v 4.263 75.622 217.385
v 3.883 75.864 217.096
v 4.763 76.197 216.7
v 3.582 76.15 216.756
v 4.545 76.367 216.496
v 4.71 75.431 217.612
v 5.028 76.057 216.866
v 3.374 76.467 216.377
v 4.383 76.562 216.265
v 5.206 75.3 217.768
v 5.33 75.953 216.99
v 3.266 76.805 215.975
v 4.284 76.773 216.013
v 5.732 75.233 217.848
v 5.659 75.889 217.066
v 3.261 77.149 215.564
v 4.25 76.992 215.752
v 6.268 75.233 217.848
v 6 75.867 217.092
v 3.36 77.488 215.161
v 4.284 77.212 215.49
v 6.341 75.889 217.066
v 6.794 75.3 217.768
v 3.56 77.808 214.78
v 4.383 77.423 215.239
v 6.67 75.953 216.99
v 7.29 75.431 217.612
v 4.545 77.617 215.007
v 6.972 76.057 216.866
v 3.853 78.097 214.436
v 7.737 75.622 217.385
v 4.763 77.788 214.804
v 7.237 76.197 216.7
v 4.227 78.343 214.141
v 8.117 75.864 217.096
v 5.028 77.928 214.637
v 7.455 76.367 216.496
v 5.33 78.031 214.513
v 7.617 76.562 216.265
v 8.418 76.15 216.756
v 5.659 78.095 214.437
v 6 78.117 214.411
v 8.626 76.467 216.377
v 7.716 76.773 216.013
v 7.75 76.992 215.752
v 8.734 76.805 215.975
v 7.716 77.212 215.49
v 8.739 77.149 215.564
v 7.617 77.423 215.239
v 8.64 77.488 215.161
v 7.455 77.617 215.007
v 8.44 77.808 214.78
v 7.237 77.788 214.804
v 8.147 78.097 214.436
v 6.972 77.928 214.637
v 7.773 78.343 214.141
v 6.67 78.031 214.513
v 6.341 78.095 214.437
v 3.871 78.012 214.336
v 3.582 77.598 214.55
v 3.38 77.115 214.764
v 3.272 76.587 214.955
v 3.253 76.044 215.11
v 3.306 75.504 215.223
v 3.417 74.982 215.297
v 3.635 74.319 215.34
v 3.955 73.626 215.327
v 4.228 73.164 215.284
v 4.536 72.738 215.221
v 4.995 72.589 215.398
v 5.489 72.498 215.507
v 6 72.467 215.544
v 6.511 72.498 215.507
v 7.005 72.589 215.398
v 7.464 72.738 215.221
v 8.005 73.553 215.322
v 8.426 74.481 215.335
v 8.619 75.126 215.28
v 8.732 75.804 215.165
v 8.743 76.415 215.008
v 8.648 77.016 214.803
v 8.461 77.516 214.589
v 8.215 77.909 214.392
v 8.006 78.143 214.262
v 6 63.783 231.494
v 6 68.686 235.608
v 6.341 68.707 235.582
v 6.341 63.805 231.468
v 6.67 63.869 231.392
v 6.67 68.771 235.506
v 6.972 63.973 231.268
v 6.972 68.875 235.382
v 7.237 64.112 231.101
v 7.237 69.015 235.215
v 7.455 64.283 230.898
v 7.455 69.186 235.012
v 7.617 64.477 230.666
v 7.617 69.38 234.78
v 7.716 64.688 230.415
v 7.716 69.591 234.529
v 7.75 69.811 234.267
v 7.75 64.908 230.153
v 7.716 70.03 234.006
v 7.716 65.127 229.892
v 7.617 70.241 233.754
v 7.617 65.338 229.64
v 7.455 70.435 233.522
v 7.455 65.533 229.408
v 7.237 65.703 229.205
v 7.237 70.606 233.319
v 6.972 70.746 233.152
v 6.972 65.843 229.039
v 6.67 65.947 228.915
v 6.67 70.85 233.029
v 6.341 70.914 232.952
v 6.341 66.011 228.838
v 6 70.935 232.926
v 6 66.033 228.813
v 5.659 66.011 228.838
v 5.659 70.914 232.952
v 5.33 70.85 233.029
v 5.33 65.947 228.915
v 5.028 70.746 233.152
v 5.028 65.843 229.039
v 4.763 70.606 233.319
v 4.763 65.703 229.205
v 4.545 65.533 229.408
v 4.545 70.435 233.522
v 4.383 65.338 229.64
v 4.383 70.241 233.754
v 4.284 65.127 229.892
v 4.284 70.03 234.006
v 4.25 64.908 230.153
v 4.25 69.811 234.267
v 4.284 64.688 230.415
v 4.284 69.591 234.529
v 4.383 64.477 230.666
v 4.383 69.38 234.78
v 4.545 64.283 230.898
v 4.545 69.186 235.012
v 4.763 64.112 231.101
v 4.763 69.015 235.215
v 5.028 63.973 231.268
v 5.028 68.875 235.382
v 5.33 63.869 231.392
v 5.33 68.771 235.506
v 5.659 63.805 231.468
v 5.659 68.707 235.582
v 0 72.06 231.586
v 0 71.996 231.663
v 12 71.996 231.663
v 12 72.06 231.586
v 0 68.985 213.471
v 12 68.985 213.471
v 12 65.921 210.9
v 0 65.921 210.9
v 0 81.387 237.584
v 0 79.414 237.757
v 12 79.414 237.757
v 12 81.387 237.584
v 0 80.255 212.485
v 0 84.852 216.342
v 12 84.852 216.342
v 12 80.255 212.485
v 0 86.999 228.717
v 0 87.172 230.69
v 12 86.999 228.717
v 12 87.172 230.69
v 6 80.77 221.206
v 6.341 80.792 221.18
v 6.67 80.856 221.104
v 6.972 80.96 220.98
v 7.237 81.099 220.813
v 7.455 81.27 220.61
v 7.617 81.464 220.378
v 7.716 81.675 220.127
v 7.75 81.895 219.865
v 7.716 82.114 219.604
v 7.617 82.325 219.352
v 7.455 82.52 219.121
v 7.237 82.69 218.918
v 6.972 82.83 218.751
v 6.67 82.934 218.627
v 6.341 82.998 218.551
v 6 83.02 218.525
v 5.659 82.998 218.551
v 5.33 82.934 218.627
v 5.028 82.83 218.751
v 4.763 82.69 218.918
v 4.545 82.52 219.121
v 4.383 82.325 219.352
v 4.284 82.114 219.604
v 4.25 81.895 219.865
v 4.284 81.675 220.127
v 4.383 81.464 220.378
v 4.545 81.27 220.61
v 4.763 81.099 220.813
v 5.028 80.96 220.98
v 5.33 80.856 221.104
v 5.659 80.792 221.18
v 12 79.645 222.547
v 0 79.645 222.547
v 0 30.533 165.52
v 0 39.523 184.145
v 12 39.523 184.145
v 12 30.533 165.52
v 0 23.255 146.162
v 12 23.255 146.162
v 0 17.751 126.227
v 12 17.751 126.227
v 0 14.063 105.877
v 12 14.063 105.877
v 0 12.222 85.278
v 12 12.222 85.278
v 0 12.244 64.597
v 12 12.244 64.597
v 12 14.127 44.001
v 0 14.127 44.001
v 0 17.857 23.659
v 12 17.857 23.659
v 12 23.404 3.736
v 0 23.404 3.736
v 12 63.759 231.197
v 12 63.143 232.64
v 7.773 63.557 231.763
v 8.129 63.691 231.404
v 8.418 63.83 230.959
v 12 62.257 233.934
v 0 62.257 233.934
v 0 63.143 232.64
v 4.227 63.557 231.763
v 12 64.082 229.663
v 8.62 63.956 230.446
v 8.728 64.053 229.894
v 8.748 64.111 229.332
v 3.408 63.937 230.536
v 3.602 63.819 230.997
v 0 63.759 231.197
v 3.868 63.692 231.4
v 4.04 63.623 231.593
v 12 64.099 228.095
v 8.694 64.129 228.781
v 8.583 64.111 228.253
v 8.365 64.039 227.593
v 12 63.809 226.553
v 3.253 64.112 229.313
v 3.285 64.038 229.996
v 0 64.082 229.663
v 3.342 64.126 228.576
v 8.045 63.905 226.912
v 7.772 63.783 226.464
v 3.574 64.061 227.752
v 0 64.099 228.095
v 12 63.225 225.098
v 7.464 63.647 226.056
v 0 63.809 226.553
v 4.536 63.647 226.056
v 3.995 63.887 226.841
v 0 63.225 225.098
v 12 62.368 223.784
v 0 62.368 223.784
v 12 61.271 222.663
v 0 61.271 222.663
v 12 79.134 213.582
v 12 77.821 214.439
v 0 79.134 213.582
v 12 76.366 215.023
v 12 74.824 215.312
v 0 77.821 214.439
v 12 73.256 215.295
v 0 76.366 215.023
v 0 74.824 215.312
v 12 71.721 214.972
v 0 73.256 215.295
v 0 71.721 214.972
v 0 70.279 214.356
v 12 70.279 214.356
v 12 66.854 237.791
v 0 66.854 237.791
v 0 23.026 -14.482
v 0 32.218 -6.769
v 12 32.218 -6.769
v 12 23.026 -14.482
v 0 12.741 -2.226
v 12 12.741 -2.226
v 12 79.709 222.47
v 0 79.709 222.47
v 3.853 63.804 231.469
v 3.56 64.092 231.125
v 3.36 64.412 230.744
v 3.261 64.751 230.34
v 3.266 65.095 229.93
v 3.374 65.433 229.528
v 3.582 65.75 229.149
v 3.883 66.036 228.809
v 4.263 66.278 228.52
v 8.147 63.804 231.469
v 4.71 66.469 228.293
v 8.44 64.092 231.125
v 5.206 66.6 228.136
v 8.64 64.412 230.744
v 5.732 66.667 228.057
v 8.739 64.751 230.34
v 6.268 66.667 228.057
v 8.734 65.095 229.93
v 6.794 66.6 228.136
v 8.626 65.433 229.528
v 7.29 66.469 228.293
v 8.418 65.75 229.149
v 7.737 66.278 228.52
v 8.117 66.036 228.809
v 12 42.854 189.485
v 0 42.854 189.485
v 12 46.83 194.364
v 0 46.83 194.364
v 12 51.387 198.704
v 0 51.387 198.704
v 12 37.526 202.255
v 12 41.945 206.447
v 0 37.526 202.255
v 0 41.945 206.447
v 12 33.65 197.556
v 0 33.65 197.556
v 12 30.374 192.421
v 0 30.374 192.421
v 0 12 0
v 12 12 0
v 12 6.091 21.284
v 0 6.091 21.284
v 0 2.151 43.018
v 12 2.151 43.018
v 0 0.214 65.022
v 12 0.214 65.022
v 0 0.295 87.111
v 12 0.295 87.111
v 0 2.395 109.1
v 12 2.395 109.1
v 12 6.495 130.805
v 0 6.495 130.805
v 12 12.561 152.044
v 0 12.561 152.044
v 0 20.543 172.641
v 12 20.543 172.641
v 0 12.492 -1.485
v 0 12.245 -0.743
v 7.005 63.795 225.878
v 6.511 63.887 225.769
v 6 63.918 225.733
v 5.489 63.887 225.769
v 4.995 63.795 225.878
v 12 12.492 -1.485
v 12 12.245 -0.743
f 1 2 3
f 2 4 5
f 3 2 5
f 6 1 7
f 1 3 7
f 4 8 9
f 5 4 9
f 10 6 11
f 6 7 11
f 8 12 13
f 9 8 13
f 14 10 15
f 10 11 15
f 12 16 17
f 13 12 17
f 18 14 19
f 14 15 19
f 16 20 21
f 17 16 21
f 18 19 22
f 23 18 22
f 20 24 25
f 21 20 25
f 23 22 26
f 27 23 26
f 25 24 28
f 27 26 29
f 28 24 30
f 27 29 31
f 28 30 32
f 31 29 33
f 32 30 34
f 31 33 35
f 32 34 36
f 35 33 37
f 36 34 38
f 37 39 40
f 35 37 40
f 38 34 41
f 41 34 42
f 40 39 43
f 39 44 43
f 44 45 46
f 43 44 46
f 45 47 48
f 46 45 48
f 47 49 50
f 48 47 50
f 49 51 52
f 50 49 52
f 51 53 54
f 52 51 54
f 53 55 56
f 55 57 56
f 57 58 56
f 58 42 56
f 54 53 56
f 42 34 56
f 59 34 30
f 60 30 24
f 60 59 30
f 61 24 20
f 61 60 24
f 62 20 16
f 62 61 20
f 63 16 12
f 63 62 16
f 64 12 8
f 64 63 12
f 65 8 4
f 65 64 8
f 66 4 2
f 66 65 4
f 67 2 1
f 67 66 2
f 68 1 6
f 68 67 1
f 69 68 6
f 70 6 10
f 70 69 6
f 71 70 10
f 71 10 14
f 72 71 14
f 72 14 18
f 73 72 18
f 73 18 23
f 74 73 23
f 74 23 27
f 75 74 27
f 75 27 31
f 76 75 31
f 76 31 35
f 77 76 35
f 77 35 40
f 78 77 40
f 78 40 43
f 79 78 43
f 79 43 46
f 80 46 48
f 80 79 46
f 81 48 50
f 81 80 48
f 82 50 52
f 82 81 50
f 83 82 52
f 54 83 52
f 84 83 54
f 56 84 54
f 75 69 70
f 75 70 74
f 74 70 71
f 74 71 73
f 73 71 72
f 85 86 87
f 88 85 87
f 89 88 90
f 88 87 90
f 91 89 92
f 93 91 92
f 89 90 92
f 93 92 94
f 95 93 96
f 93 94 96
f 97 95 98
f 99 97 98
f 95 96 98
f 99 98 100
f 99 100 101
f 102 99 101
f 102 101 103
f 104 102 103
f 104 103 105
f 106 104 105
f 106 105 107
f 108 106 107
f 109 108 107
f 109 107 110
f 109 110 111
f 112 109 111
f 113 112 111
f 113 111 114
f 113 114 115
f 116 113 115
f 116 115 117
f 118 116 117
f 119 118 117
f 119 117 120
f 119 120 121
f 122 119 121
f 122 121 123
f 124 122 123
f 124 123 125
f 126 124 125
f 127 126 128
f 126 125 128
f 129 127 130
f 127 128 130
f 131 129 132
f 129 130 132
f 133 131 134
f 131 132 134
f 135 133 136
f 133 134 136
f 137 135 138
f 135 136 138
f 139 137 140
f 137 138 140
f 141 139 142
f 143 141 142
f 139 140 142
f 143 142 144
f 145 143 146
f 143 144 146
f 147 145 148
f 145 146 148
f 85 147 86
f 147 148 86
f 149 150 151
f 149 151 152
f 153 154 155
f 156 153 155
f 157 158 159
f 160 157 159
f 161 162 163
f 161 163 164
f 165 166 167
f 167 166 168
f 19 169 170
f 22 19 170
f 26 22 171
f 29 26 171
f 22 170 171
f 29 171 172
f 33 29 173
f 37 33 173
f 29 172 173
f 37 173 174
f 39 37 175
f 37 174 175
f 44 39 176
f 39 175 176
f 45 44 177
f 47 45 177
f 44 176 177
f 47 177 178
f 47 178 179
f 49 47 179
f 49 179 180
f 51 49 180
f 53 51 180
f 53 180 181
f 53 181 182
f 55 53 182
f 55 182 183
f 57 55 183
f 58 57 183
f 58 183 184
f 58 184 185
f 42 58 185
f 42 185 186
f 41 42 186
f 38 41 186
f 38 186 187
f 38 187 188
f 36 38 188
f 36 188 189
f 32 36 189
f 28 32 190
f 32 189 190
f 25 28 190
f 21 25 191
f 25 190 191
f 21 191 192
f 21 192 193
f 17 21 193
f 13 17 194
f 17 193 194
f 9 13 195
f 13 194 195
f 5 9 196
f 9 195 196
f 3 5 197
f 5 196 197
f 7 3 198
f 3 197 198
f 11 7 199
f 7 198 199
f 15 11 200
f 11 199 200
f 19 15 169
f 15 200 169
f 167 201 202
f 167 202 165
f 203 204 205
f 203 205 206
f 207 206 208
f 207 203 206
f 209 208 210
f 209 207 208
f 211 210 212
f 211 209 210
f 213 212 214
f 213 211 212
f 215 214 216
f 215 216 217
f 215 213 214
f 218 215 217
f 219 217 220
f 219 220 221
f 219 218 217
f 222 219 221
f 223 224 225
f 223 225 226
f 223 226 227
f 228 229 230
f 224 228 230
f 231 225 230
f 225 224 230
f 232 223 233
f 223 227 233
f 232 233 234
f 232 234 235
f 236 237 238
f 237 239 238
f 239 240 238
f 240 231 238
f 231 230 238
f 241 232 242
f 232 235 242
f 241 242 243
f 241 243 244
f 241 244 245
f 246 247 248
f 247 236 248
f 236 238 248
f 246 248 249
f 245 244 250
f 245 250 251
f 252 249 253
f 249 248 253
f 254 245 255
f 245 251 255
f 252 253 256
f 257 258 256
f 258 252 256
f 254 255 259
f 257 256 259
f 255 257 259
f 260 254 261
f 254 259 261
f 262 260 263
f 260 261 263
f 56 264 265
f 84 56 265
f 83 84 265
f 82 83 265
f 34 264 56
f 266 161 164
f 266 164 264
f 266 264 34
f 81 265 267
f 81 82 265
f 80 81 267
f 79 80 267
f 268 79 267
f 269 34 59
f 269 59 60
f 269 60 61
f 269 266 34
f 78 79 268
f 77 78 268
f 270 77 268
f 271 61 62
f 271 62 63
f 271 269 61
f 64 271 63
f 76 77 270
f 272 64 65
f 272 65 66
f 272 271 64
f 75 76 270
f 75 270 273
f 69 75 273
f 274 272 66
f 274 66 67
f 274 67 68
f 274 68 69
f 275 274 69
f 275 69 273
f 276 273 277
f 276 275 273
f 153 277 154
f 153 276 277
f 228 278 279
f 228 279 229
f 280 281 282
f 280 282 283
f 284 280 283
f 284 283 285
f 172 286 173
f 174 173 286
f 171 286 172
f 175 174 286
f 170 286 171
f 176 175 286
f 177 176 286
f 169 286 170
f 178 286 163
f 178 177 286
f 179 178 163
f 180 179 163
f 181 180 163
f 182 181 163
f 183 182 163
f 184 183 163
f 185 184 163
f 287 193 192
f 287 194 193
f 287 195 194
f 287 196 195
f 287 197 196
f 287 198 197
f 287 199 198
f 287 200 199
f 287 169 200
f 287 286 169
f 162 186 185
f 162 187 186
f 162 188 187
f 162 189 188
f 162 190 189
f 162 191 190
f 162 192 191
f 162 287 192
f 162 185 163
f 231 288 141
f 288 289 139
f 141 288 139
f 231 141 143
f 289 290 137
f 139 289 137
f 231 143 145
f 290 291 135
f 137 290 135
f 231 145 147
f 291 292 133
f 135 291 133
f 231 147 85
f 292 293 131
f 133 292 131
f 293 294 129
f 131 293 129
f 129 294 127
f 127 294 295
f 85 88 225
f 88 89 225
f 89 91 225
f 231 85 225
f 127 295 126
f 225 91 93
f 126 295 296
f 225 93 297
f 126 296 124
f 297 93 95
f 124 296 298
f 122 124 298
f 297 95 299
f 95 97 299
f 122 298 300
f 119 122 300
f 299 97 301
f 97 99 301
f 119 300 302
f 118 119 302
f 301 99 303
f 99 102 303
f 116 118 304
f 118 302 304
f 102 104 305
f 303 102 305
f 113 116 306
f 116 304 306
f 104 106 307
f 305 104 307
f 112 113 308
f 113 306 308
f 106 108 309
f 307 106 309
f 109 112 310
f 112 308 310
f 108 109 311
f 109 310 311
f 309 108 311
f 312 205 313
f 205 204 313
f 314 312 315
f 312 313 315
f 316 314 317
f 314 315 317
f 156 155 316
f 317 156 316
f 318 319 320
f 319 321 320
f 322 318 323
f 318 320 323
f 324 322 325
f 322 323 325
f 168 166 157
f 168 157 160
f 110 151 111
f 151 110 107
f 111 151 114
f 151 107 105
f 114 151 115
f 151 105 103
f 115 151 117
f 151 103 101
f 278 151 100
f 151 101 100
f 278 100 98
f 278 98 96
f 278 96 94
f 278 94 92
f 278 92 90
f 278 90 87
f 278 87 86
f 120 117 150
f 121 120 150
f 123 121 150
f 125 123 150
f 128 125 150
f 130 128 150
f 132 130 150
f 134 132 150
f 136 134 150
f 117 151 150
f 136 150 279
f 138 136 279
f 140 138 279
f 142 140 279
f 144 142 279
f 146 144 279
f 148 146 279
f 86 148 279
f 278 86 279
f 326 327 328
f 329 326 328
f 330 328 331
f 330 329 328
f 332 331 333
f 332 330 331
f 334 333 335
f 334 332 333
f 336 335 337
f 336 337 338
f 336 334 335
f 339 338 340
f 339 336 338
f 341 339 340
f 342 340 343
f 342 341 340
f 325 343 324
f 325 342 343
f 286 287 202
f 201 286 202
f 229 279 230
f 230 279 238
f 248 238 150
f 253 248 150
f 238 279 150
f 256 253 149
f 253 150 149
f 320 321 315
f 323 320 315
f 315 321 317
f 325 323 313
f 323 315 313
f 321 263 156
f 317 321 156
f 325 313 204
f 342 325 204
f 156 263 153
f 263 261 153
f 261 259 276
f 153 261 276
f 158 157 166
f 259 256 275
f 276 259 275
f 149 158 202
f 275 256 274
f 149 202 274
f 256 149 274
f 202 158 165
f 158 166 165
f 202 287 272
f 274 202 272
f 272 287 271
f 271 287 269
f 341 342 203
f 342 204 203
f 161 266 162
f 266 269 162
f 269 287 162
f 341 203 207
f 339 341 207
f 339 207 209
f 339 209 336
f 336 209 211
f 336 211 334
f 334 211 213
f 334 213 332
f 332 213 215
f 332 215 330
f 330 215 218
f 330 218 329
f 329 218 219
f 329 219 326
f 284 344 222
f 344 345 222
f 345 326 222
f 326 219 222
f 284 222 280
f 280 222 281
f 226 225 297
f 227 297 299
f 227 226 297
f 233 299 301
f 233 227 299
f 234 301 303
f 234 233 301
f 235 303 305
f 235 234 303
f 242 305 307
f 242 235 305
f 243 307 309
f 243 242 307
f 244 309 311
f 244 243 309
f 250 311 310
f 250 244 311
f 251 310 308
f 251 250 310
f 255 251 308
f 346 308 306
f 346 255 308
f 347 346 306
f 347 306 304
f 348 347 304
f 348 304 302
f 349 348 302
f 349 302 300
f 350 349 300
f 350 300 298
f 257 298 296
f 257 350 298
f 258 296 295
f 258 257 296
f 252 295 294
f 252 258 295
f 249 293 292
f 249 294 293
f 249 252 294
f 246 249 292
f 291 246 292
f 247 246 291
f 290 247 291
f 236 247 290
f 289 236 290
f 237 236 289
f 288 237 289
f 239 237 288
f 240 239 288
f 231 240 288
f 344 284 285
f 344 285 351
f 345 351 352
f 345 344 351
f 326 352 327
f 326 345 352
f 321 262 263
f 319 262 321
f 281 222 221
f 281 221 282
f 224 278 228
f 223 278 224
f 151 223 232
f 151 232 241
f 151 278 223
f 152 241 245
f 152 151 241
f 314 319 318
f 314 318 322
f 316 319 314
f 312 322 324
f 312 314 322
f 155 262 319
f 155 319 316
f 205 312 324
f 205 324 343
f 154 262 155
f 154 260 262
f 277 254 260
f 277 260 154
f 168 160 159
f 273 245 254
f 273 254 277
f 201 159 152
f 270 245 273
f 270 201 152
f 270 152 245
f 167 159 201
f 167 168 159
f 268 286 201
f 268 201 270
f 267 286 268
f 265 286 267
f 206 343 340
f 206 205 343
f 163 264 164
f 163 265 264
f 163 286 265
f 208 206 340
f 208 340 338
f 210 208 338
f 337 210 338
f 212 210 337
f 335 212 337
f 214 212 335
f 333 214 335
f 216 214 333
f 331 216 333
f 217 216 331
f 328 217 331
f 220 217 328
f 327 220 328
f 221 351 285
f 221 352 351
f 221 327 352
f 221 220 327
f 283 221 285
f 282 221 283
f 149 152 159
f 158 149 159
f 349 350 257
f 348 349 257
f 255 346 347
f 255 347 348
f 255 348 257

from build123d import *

# Parameters (mm, degrees)
AUFSATZ_LINEAR_AUSTRAGEN1_DEPTH = 12
AUFSATZ_LINEAR_AUSTRAGEN3_DEPTH = 12
AUFSATZ_LINEAR_AUSTRAGEN4_DEPTH = 12
SCHNITT_LINEAR_AUSTRAGEN1_DEPTH = 254.175024926
VERRUNDUNG1_R                   = 50
SKIZZE9_W                       = 12
SKIZZE9_H                       = 12
AUFSATZ_LINEAR_AUSTRAGEN6_DEPTH = 11
AUFSATZ_LINEAR_AUSTRAGEN7_DEPTH = 12
SKIZZE11_R                      = 1.75
SCHNITT_LINEAR_AUSTRAGEN3_DEPTH = 10
SKIZZE12_R                      = 2.75
SCHNITT_LINEAR_AUSTRAGEN4_DEPTH = 3.6
FASE1_SIZE                      = 1.5
SCHNITT_LINEAR_AUSTRAGEN8_DEPTH = 254.549622303


with BuildPart() as part:
    # Skizze1 → Aufsatz-Linear austragen1 (new body)
    with BuildSketch(Plane(origin=(0, 0, 0), x_dir=(0, 0, -1), z_dir=(1, 0, 0))):
        with BuildLine():
            Line((-240, 65), (-230.735708163, 72.773663864))
            ThreePointArc((-230.735708163, 72.773663864), (-123.944567763, 17.242039243), (-3.735818811, 23.403668612))
            Line((-3.735818811, 23.403668612), (0, 12))
            ThreePointArc((0, 12), (-127.247502729, 5.681119716), (-240, 65))
        make_face()
    extrude(amount=AUFSATZ_LINEAR_AUSTRAGEN1_DEPTH)

    # Skizze4 → Aufsatz-Linear austragen3 (add)
    with BuildSketch(Plane(origin=(0, 0, 0), x_dir=(0, 0, -1), z_dir=(1, 0, 0))):
        with BuildLine():
            Line((-3.735818811, 23.403668612), (6.769031275, 32.218284445))
            Line((6.769031275, 32.218284445), (14.482482591, 23.025751128))
            Line((14.482482591, 23.025751128), (2.225771501, 12.741149373))
            ThreePointArc((2.225771501, 12.741149373), (1.113785782, 12.367871772), (0, 12))
            Line((0, 12), (-3.735818811, 23.403668612))
        make_face()
    extrude(amount=AUFSATZ_LINEAR_AUSTRAGEN3_DEPTH)

    # Skizze5 → Aufsatz-Linear austragen4 (add)
    with BuildSketch(Plane(origin=(12, 0, 0), x_dir=(0, 0, -1), z_dir=(1, 0, 0))):
        Polygon((-231.662517154, 71.995978781), (-222.469983836, 79.709430098), (-210.899806862, 65.920630121), (-192.948331238, 44.526894555), (-220.092340179, 58.207178805), align=None)
    extrude(amount=-AUFSATZ_LINEAR_AUSTRAGEN4_DEPTH)

    # Skizze6 → Schnitt-Linear austragen1 (cut, through all)
    with BuildSketch(Plane(origin=(12, 0, 0), x_dir=(0, 0, -1), z_dir=(1, 0, 0))):
        Polygon((-231.662517154, 71.995978781), (-199.510648028, 33.678873242), (-204.367668784, 29.603348917), (-240, 65), align=None)
    extrude(amount=-SCHNITT_LINEAR_AUSTRAGEN1_DEPTH, mode=Mode.SUBTRACT)

    # Verrundung1
    verrundung1_edges = [part.edges().sort_by_distance(p)[0] for p in [
        (6, 44.526894555, 192.948331238),
        (6, 35.285406895, 200.858689823),
    ]]
    fillet(verrundung1_edges, radius=VERRUNDUNG1_R)

    # Skizze9 → Aufsatz-Linear austragen6 (add)
    with BuildSketch(Plane(origin=(0, 156.320496136, 131.168470653), x_dir=(1, 0, 0), z_dir=(0, 0.7660444431189836, 0.6427876096865328))):
        with Locations((6, -125.185660837)):
            Rectangle(SKIZZE9_W, SKIZZE9_H)
    extrude(amount=AUFSATZ_LINEAR_AUSTRAGEN6_DEPTH)

    # Skizze10 → Aufsatz-Linear austragen7 (add)
    with BuildSketch(Plane.ZY):
        with BuildLine():
            Line((231.662517154, 71.995978781), (237.790872699, 66.853677904))
            Line((237.790872699, 66.853677904), (233.93414704, 62.257411245))
            ThreePointArc((233.93414704, 62.257411245), (228.094600221, 64.098613285), (222.663490618, 61.271356578))
            Line((222.663490618, 61.271356578), (231.662517154, 71.995978781))
        make_face()
        with BuildLine():
            Line((213.470957301, 68.984807894), (222.469983836, 79.709430098))
            Line((222.469983836, 79.709430098), (216.341628291, 84.851730975))
            Line((216.341628291, 84.851730975), (212.484902633, 80.255464316))
            ThreePointArc((212.484902633, 80.255464316), (215.31215934, 74.824354713), (213.470957301, 68.984807894))
        make_face()
    extrude(amount=-AUFSATZ_LINEAR_AUSTRAGEN7_DEPTH)

    # Skizze11 → Schnitt-Linear austragen3 (cut)
    with BuildSketch(Plane(origin=(0, 156.320496136, 131.168470653), x_dir=(1, 0, 0), z_dir=(0, 0.7660444431189826, 0.642787609686534))):
        with Locations(Location((6, -115.785660837, 0), (0, 0, 270))):
            Circle(SKIZZE11_R)
        with Locations(Location((6, -134.585660837, 0), (0, 0, 270))):
            Circle(SKIZZE11_R)
    extrude(amount=-SCHNITT_LINEAR_AUSTRAGEN3_DEPTH, mode=Mode.SUBTRACT)

    # Skizze12 → Schnitt-Linear austragen4 (cut)
    with BuildSketch(Plane(origin=(0, 148.660051704, 124.740594556), x_dir=(1, 0, 0), z_dir=(0, 0.7660444431189826, 0.642787609686534))):
        with Locations((6, -134.585660837)):
            Circle(SKIZZE12_R)
        with Locations((6, -115.785660837)):
            Circle(SKIZZE12_R)
    extrude(amount=SCHNITT_LINEAR_AUSTRAGEN4_DEPTH, mode=Mode.SUBTRACT)

    # Fase1
    fase1_edges = [part.edges().sort_by_distance(p)[0] for p in [
        (6, 88.135918972, 229.540647543),
        (6, 80.422467656, 238.73318086),
    ]]
    chamfer(fase1_edges, length=FASE1_SIZE)

    # Skizze16 → Schnitt-Linear austragen8 (cut, through all)
    with BuildSketch(Plane(origin=(12, 0, 0), x_dir=(0, 0, -1), z_dir=(1, 0, 0))):
        Polygon((-222.469983836, 79.709430098), (-222.546588281, 79.645151337), (-228.717349334, 86.999177991), (-228.640744889, 87.063456752), align=None)
        Polygon((-237.833278207, 79.350005435), (-231.662517154, 71.995978781), (-231.585912709, 72.060257542), (-237.756673762, 79.414284196), align=None)
    extrude(amount=-SCHNITT_LINEAR_AUSTRAGEN8_DEPTH, mode=Mode.SUBTRACT)


solid = part.part
